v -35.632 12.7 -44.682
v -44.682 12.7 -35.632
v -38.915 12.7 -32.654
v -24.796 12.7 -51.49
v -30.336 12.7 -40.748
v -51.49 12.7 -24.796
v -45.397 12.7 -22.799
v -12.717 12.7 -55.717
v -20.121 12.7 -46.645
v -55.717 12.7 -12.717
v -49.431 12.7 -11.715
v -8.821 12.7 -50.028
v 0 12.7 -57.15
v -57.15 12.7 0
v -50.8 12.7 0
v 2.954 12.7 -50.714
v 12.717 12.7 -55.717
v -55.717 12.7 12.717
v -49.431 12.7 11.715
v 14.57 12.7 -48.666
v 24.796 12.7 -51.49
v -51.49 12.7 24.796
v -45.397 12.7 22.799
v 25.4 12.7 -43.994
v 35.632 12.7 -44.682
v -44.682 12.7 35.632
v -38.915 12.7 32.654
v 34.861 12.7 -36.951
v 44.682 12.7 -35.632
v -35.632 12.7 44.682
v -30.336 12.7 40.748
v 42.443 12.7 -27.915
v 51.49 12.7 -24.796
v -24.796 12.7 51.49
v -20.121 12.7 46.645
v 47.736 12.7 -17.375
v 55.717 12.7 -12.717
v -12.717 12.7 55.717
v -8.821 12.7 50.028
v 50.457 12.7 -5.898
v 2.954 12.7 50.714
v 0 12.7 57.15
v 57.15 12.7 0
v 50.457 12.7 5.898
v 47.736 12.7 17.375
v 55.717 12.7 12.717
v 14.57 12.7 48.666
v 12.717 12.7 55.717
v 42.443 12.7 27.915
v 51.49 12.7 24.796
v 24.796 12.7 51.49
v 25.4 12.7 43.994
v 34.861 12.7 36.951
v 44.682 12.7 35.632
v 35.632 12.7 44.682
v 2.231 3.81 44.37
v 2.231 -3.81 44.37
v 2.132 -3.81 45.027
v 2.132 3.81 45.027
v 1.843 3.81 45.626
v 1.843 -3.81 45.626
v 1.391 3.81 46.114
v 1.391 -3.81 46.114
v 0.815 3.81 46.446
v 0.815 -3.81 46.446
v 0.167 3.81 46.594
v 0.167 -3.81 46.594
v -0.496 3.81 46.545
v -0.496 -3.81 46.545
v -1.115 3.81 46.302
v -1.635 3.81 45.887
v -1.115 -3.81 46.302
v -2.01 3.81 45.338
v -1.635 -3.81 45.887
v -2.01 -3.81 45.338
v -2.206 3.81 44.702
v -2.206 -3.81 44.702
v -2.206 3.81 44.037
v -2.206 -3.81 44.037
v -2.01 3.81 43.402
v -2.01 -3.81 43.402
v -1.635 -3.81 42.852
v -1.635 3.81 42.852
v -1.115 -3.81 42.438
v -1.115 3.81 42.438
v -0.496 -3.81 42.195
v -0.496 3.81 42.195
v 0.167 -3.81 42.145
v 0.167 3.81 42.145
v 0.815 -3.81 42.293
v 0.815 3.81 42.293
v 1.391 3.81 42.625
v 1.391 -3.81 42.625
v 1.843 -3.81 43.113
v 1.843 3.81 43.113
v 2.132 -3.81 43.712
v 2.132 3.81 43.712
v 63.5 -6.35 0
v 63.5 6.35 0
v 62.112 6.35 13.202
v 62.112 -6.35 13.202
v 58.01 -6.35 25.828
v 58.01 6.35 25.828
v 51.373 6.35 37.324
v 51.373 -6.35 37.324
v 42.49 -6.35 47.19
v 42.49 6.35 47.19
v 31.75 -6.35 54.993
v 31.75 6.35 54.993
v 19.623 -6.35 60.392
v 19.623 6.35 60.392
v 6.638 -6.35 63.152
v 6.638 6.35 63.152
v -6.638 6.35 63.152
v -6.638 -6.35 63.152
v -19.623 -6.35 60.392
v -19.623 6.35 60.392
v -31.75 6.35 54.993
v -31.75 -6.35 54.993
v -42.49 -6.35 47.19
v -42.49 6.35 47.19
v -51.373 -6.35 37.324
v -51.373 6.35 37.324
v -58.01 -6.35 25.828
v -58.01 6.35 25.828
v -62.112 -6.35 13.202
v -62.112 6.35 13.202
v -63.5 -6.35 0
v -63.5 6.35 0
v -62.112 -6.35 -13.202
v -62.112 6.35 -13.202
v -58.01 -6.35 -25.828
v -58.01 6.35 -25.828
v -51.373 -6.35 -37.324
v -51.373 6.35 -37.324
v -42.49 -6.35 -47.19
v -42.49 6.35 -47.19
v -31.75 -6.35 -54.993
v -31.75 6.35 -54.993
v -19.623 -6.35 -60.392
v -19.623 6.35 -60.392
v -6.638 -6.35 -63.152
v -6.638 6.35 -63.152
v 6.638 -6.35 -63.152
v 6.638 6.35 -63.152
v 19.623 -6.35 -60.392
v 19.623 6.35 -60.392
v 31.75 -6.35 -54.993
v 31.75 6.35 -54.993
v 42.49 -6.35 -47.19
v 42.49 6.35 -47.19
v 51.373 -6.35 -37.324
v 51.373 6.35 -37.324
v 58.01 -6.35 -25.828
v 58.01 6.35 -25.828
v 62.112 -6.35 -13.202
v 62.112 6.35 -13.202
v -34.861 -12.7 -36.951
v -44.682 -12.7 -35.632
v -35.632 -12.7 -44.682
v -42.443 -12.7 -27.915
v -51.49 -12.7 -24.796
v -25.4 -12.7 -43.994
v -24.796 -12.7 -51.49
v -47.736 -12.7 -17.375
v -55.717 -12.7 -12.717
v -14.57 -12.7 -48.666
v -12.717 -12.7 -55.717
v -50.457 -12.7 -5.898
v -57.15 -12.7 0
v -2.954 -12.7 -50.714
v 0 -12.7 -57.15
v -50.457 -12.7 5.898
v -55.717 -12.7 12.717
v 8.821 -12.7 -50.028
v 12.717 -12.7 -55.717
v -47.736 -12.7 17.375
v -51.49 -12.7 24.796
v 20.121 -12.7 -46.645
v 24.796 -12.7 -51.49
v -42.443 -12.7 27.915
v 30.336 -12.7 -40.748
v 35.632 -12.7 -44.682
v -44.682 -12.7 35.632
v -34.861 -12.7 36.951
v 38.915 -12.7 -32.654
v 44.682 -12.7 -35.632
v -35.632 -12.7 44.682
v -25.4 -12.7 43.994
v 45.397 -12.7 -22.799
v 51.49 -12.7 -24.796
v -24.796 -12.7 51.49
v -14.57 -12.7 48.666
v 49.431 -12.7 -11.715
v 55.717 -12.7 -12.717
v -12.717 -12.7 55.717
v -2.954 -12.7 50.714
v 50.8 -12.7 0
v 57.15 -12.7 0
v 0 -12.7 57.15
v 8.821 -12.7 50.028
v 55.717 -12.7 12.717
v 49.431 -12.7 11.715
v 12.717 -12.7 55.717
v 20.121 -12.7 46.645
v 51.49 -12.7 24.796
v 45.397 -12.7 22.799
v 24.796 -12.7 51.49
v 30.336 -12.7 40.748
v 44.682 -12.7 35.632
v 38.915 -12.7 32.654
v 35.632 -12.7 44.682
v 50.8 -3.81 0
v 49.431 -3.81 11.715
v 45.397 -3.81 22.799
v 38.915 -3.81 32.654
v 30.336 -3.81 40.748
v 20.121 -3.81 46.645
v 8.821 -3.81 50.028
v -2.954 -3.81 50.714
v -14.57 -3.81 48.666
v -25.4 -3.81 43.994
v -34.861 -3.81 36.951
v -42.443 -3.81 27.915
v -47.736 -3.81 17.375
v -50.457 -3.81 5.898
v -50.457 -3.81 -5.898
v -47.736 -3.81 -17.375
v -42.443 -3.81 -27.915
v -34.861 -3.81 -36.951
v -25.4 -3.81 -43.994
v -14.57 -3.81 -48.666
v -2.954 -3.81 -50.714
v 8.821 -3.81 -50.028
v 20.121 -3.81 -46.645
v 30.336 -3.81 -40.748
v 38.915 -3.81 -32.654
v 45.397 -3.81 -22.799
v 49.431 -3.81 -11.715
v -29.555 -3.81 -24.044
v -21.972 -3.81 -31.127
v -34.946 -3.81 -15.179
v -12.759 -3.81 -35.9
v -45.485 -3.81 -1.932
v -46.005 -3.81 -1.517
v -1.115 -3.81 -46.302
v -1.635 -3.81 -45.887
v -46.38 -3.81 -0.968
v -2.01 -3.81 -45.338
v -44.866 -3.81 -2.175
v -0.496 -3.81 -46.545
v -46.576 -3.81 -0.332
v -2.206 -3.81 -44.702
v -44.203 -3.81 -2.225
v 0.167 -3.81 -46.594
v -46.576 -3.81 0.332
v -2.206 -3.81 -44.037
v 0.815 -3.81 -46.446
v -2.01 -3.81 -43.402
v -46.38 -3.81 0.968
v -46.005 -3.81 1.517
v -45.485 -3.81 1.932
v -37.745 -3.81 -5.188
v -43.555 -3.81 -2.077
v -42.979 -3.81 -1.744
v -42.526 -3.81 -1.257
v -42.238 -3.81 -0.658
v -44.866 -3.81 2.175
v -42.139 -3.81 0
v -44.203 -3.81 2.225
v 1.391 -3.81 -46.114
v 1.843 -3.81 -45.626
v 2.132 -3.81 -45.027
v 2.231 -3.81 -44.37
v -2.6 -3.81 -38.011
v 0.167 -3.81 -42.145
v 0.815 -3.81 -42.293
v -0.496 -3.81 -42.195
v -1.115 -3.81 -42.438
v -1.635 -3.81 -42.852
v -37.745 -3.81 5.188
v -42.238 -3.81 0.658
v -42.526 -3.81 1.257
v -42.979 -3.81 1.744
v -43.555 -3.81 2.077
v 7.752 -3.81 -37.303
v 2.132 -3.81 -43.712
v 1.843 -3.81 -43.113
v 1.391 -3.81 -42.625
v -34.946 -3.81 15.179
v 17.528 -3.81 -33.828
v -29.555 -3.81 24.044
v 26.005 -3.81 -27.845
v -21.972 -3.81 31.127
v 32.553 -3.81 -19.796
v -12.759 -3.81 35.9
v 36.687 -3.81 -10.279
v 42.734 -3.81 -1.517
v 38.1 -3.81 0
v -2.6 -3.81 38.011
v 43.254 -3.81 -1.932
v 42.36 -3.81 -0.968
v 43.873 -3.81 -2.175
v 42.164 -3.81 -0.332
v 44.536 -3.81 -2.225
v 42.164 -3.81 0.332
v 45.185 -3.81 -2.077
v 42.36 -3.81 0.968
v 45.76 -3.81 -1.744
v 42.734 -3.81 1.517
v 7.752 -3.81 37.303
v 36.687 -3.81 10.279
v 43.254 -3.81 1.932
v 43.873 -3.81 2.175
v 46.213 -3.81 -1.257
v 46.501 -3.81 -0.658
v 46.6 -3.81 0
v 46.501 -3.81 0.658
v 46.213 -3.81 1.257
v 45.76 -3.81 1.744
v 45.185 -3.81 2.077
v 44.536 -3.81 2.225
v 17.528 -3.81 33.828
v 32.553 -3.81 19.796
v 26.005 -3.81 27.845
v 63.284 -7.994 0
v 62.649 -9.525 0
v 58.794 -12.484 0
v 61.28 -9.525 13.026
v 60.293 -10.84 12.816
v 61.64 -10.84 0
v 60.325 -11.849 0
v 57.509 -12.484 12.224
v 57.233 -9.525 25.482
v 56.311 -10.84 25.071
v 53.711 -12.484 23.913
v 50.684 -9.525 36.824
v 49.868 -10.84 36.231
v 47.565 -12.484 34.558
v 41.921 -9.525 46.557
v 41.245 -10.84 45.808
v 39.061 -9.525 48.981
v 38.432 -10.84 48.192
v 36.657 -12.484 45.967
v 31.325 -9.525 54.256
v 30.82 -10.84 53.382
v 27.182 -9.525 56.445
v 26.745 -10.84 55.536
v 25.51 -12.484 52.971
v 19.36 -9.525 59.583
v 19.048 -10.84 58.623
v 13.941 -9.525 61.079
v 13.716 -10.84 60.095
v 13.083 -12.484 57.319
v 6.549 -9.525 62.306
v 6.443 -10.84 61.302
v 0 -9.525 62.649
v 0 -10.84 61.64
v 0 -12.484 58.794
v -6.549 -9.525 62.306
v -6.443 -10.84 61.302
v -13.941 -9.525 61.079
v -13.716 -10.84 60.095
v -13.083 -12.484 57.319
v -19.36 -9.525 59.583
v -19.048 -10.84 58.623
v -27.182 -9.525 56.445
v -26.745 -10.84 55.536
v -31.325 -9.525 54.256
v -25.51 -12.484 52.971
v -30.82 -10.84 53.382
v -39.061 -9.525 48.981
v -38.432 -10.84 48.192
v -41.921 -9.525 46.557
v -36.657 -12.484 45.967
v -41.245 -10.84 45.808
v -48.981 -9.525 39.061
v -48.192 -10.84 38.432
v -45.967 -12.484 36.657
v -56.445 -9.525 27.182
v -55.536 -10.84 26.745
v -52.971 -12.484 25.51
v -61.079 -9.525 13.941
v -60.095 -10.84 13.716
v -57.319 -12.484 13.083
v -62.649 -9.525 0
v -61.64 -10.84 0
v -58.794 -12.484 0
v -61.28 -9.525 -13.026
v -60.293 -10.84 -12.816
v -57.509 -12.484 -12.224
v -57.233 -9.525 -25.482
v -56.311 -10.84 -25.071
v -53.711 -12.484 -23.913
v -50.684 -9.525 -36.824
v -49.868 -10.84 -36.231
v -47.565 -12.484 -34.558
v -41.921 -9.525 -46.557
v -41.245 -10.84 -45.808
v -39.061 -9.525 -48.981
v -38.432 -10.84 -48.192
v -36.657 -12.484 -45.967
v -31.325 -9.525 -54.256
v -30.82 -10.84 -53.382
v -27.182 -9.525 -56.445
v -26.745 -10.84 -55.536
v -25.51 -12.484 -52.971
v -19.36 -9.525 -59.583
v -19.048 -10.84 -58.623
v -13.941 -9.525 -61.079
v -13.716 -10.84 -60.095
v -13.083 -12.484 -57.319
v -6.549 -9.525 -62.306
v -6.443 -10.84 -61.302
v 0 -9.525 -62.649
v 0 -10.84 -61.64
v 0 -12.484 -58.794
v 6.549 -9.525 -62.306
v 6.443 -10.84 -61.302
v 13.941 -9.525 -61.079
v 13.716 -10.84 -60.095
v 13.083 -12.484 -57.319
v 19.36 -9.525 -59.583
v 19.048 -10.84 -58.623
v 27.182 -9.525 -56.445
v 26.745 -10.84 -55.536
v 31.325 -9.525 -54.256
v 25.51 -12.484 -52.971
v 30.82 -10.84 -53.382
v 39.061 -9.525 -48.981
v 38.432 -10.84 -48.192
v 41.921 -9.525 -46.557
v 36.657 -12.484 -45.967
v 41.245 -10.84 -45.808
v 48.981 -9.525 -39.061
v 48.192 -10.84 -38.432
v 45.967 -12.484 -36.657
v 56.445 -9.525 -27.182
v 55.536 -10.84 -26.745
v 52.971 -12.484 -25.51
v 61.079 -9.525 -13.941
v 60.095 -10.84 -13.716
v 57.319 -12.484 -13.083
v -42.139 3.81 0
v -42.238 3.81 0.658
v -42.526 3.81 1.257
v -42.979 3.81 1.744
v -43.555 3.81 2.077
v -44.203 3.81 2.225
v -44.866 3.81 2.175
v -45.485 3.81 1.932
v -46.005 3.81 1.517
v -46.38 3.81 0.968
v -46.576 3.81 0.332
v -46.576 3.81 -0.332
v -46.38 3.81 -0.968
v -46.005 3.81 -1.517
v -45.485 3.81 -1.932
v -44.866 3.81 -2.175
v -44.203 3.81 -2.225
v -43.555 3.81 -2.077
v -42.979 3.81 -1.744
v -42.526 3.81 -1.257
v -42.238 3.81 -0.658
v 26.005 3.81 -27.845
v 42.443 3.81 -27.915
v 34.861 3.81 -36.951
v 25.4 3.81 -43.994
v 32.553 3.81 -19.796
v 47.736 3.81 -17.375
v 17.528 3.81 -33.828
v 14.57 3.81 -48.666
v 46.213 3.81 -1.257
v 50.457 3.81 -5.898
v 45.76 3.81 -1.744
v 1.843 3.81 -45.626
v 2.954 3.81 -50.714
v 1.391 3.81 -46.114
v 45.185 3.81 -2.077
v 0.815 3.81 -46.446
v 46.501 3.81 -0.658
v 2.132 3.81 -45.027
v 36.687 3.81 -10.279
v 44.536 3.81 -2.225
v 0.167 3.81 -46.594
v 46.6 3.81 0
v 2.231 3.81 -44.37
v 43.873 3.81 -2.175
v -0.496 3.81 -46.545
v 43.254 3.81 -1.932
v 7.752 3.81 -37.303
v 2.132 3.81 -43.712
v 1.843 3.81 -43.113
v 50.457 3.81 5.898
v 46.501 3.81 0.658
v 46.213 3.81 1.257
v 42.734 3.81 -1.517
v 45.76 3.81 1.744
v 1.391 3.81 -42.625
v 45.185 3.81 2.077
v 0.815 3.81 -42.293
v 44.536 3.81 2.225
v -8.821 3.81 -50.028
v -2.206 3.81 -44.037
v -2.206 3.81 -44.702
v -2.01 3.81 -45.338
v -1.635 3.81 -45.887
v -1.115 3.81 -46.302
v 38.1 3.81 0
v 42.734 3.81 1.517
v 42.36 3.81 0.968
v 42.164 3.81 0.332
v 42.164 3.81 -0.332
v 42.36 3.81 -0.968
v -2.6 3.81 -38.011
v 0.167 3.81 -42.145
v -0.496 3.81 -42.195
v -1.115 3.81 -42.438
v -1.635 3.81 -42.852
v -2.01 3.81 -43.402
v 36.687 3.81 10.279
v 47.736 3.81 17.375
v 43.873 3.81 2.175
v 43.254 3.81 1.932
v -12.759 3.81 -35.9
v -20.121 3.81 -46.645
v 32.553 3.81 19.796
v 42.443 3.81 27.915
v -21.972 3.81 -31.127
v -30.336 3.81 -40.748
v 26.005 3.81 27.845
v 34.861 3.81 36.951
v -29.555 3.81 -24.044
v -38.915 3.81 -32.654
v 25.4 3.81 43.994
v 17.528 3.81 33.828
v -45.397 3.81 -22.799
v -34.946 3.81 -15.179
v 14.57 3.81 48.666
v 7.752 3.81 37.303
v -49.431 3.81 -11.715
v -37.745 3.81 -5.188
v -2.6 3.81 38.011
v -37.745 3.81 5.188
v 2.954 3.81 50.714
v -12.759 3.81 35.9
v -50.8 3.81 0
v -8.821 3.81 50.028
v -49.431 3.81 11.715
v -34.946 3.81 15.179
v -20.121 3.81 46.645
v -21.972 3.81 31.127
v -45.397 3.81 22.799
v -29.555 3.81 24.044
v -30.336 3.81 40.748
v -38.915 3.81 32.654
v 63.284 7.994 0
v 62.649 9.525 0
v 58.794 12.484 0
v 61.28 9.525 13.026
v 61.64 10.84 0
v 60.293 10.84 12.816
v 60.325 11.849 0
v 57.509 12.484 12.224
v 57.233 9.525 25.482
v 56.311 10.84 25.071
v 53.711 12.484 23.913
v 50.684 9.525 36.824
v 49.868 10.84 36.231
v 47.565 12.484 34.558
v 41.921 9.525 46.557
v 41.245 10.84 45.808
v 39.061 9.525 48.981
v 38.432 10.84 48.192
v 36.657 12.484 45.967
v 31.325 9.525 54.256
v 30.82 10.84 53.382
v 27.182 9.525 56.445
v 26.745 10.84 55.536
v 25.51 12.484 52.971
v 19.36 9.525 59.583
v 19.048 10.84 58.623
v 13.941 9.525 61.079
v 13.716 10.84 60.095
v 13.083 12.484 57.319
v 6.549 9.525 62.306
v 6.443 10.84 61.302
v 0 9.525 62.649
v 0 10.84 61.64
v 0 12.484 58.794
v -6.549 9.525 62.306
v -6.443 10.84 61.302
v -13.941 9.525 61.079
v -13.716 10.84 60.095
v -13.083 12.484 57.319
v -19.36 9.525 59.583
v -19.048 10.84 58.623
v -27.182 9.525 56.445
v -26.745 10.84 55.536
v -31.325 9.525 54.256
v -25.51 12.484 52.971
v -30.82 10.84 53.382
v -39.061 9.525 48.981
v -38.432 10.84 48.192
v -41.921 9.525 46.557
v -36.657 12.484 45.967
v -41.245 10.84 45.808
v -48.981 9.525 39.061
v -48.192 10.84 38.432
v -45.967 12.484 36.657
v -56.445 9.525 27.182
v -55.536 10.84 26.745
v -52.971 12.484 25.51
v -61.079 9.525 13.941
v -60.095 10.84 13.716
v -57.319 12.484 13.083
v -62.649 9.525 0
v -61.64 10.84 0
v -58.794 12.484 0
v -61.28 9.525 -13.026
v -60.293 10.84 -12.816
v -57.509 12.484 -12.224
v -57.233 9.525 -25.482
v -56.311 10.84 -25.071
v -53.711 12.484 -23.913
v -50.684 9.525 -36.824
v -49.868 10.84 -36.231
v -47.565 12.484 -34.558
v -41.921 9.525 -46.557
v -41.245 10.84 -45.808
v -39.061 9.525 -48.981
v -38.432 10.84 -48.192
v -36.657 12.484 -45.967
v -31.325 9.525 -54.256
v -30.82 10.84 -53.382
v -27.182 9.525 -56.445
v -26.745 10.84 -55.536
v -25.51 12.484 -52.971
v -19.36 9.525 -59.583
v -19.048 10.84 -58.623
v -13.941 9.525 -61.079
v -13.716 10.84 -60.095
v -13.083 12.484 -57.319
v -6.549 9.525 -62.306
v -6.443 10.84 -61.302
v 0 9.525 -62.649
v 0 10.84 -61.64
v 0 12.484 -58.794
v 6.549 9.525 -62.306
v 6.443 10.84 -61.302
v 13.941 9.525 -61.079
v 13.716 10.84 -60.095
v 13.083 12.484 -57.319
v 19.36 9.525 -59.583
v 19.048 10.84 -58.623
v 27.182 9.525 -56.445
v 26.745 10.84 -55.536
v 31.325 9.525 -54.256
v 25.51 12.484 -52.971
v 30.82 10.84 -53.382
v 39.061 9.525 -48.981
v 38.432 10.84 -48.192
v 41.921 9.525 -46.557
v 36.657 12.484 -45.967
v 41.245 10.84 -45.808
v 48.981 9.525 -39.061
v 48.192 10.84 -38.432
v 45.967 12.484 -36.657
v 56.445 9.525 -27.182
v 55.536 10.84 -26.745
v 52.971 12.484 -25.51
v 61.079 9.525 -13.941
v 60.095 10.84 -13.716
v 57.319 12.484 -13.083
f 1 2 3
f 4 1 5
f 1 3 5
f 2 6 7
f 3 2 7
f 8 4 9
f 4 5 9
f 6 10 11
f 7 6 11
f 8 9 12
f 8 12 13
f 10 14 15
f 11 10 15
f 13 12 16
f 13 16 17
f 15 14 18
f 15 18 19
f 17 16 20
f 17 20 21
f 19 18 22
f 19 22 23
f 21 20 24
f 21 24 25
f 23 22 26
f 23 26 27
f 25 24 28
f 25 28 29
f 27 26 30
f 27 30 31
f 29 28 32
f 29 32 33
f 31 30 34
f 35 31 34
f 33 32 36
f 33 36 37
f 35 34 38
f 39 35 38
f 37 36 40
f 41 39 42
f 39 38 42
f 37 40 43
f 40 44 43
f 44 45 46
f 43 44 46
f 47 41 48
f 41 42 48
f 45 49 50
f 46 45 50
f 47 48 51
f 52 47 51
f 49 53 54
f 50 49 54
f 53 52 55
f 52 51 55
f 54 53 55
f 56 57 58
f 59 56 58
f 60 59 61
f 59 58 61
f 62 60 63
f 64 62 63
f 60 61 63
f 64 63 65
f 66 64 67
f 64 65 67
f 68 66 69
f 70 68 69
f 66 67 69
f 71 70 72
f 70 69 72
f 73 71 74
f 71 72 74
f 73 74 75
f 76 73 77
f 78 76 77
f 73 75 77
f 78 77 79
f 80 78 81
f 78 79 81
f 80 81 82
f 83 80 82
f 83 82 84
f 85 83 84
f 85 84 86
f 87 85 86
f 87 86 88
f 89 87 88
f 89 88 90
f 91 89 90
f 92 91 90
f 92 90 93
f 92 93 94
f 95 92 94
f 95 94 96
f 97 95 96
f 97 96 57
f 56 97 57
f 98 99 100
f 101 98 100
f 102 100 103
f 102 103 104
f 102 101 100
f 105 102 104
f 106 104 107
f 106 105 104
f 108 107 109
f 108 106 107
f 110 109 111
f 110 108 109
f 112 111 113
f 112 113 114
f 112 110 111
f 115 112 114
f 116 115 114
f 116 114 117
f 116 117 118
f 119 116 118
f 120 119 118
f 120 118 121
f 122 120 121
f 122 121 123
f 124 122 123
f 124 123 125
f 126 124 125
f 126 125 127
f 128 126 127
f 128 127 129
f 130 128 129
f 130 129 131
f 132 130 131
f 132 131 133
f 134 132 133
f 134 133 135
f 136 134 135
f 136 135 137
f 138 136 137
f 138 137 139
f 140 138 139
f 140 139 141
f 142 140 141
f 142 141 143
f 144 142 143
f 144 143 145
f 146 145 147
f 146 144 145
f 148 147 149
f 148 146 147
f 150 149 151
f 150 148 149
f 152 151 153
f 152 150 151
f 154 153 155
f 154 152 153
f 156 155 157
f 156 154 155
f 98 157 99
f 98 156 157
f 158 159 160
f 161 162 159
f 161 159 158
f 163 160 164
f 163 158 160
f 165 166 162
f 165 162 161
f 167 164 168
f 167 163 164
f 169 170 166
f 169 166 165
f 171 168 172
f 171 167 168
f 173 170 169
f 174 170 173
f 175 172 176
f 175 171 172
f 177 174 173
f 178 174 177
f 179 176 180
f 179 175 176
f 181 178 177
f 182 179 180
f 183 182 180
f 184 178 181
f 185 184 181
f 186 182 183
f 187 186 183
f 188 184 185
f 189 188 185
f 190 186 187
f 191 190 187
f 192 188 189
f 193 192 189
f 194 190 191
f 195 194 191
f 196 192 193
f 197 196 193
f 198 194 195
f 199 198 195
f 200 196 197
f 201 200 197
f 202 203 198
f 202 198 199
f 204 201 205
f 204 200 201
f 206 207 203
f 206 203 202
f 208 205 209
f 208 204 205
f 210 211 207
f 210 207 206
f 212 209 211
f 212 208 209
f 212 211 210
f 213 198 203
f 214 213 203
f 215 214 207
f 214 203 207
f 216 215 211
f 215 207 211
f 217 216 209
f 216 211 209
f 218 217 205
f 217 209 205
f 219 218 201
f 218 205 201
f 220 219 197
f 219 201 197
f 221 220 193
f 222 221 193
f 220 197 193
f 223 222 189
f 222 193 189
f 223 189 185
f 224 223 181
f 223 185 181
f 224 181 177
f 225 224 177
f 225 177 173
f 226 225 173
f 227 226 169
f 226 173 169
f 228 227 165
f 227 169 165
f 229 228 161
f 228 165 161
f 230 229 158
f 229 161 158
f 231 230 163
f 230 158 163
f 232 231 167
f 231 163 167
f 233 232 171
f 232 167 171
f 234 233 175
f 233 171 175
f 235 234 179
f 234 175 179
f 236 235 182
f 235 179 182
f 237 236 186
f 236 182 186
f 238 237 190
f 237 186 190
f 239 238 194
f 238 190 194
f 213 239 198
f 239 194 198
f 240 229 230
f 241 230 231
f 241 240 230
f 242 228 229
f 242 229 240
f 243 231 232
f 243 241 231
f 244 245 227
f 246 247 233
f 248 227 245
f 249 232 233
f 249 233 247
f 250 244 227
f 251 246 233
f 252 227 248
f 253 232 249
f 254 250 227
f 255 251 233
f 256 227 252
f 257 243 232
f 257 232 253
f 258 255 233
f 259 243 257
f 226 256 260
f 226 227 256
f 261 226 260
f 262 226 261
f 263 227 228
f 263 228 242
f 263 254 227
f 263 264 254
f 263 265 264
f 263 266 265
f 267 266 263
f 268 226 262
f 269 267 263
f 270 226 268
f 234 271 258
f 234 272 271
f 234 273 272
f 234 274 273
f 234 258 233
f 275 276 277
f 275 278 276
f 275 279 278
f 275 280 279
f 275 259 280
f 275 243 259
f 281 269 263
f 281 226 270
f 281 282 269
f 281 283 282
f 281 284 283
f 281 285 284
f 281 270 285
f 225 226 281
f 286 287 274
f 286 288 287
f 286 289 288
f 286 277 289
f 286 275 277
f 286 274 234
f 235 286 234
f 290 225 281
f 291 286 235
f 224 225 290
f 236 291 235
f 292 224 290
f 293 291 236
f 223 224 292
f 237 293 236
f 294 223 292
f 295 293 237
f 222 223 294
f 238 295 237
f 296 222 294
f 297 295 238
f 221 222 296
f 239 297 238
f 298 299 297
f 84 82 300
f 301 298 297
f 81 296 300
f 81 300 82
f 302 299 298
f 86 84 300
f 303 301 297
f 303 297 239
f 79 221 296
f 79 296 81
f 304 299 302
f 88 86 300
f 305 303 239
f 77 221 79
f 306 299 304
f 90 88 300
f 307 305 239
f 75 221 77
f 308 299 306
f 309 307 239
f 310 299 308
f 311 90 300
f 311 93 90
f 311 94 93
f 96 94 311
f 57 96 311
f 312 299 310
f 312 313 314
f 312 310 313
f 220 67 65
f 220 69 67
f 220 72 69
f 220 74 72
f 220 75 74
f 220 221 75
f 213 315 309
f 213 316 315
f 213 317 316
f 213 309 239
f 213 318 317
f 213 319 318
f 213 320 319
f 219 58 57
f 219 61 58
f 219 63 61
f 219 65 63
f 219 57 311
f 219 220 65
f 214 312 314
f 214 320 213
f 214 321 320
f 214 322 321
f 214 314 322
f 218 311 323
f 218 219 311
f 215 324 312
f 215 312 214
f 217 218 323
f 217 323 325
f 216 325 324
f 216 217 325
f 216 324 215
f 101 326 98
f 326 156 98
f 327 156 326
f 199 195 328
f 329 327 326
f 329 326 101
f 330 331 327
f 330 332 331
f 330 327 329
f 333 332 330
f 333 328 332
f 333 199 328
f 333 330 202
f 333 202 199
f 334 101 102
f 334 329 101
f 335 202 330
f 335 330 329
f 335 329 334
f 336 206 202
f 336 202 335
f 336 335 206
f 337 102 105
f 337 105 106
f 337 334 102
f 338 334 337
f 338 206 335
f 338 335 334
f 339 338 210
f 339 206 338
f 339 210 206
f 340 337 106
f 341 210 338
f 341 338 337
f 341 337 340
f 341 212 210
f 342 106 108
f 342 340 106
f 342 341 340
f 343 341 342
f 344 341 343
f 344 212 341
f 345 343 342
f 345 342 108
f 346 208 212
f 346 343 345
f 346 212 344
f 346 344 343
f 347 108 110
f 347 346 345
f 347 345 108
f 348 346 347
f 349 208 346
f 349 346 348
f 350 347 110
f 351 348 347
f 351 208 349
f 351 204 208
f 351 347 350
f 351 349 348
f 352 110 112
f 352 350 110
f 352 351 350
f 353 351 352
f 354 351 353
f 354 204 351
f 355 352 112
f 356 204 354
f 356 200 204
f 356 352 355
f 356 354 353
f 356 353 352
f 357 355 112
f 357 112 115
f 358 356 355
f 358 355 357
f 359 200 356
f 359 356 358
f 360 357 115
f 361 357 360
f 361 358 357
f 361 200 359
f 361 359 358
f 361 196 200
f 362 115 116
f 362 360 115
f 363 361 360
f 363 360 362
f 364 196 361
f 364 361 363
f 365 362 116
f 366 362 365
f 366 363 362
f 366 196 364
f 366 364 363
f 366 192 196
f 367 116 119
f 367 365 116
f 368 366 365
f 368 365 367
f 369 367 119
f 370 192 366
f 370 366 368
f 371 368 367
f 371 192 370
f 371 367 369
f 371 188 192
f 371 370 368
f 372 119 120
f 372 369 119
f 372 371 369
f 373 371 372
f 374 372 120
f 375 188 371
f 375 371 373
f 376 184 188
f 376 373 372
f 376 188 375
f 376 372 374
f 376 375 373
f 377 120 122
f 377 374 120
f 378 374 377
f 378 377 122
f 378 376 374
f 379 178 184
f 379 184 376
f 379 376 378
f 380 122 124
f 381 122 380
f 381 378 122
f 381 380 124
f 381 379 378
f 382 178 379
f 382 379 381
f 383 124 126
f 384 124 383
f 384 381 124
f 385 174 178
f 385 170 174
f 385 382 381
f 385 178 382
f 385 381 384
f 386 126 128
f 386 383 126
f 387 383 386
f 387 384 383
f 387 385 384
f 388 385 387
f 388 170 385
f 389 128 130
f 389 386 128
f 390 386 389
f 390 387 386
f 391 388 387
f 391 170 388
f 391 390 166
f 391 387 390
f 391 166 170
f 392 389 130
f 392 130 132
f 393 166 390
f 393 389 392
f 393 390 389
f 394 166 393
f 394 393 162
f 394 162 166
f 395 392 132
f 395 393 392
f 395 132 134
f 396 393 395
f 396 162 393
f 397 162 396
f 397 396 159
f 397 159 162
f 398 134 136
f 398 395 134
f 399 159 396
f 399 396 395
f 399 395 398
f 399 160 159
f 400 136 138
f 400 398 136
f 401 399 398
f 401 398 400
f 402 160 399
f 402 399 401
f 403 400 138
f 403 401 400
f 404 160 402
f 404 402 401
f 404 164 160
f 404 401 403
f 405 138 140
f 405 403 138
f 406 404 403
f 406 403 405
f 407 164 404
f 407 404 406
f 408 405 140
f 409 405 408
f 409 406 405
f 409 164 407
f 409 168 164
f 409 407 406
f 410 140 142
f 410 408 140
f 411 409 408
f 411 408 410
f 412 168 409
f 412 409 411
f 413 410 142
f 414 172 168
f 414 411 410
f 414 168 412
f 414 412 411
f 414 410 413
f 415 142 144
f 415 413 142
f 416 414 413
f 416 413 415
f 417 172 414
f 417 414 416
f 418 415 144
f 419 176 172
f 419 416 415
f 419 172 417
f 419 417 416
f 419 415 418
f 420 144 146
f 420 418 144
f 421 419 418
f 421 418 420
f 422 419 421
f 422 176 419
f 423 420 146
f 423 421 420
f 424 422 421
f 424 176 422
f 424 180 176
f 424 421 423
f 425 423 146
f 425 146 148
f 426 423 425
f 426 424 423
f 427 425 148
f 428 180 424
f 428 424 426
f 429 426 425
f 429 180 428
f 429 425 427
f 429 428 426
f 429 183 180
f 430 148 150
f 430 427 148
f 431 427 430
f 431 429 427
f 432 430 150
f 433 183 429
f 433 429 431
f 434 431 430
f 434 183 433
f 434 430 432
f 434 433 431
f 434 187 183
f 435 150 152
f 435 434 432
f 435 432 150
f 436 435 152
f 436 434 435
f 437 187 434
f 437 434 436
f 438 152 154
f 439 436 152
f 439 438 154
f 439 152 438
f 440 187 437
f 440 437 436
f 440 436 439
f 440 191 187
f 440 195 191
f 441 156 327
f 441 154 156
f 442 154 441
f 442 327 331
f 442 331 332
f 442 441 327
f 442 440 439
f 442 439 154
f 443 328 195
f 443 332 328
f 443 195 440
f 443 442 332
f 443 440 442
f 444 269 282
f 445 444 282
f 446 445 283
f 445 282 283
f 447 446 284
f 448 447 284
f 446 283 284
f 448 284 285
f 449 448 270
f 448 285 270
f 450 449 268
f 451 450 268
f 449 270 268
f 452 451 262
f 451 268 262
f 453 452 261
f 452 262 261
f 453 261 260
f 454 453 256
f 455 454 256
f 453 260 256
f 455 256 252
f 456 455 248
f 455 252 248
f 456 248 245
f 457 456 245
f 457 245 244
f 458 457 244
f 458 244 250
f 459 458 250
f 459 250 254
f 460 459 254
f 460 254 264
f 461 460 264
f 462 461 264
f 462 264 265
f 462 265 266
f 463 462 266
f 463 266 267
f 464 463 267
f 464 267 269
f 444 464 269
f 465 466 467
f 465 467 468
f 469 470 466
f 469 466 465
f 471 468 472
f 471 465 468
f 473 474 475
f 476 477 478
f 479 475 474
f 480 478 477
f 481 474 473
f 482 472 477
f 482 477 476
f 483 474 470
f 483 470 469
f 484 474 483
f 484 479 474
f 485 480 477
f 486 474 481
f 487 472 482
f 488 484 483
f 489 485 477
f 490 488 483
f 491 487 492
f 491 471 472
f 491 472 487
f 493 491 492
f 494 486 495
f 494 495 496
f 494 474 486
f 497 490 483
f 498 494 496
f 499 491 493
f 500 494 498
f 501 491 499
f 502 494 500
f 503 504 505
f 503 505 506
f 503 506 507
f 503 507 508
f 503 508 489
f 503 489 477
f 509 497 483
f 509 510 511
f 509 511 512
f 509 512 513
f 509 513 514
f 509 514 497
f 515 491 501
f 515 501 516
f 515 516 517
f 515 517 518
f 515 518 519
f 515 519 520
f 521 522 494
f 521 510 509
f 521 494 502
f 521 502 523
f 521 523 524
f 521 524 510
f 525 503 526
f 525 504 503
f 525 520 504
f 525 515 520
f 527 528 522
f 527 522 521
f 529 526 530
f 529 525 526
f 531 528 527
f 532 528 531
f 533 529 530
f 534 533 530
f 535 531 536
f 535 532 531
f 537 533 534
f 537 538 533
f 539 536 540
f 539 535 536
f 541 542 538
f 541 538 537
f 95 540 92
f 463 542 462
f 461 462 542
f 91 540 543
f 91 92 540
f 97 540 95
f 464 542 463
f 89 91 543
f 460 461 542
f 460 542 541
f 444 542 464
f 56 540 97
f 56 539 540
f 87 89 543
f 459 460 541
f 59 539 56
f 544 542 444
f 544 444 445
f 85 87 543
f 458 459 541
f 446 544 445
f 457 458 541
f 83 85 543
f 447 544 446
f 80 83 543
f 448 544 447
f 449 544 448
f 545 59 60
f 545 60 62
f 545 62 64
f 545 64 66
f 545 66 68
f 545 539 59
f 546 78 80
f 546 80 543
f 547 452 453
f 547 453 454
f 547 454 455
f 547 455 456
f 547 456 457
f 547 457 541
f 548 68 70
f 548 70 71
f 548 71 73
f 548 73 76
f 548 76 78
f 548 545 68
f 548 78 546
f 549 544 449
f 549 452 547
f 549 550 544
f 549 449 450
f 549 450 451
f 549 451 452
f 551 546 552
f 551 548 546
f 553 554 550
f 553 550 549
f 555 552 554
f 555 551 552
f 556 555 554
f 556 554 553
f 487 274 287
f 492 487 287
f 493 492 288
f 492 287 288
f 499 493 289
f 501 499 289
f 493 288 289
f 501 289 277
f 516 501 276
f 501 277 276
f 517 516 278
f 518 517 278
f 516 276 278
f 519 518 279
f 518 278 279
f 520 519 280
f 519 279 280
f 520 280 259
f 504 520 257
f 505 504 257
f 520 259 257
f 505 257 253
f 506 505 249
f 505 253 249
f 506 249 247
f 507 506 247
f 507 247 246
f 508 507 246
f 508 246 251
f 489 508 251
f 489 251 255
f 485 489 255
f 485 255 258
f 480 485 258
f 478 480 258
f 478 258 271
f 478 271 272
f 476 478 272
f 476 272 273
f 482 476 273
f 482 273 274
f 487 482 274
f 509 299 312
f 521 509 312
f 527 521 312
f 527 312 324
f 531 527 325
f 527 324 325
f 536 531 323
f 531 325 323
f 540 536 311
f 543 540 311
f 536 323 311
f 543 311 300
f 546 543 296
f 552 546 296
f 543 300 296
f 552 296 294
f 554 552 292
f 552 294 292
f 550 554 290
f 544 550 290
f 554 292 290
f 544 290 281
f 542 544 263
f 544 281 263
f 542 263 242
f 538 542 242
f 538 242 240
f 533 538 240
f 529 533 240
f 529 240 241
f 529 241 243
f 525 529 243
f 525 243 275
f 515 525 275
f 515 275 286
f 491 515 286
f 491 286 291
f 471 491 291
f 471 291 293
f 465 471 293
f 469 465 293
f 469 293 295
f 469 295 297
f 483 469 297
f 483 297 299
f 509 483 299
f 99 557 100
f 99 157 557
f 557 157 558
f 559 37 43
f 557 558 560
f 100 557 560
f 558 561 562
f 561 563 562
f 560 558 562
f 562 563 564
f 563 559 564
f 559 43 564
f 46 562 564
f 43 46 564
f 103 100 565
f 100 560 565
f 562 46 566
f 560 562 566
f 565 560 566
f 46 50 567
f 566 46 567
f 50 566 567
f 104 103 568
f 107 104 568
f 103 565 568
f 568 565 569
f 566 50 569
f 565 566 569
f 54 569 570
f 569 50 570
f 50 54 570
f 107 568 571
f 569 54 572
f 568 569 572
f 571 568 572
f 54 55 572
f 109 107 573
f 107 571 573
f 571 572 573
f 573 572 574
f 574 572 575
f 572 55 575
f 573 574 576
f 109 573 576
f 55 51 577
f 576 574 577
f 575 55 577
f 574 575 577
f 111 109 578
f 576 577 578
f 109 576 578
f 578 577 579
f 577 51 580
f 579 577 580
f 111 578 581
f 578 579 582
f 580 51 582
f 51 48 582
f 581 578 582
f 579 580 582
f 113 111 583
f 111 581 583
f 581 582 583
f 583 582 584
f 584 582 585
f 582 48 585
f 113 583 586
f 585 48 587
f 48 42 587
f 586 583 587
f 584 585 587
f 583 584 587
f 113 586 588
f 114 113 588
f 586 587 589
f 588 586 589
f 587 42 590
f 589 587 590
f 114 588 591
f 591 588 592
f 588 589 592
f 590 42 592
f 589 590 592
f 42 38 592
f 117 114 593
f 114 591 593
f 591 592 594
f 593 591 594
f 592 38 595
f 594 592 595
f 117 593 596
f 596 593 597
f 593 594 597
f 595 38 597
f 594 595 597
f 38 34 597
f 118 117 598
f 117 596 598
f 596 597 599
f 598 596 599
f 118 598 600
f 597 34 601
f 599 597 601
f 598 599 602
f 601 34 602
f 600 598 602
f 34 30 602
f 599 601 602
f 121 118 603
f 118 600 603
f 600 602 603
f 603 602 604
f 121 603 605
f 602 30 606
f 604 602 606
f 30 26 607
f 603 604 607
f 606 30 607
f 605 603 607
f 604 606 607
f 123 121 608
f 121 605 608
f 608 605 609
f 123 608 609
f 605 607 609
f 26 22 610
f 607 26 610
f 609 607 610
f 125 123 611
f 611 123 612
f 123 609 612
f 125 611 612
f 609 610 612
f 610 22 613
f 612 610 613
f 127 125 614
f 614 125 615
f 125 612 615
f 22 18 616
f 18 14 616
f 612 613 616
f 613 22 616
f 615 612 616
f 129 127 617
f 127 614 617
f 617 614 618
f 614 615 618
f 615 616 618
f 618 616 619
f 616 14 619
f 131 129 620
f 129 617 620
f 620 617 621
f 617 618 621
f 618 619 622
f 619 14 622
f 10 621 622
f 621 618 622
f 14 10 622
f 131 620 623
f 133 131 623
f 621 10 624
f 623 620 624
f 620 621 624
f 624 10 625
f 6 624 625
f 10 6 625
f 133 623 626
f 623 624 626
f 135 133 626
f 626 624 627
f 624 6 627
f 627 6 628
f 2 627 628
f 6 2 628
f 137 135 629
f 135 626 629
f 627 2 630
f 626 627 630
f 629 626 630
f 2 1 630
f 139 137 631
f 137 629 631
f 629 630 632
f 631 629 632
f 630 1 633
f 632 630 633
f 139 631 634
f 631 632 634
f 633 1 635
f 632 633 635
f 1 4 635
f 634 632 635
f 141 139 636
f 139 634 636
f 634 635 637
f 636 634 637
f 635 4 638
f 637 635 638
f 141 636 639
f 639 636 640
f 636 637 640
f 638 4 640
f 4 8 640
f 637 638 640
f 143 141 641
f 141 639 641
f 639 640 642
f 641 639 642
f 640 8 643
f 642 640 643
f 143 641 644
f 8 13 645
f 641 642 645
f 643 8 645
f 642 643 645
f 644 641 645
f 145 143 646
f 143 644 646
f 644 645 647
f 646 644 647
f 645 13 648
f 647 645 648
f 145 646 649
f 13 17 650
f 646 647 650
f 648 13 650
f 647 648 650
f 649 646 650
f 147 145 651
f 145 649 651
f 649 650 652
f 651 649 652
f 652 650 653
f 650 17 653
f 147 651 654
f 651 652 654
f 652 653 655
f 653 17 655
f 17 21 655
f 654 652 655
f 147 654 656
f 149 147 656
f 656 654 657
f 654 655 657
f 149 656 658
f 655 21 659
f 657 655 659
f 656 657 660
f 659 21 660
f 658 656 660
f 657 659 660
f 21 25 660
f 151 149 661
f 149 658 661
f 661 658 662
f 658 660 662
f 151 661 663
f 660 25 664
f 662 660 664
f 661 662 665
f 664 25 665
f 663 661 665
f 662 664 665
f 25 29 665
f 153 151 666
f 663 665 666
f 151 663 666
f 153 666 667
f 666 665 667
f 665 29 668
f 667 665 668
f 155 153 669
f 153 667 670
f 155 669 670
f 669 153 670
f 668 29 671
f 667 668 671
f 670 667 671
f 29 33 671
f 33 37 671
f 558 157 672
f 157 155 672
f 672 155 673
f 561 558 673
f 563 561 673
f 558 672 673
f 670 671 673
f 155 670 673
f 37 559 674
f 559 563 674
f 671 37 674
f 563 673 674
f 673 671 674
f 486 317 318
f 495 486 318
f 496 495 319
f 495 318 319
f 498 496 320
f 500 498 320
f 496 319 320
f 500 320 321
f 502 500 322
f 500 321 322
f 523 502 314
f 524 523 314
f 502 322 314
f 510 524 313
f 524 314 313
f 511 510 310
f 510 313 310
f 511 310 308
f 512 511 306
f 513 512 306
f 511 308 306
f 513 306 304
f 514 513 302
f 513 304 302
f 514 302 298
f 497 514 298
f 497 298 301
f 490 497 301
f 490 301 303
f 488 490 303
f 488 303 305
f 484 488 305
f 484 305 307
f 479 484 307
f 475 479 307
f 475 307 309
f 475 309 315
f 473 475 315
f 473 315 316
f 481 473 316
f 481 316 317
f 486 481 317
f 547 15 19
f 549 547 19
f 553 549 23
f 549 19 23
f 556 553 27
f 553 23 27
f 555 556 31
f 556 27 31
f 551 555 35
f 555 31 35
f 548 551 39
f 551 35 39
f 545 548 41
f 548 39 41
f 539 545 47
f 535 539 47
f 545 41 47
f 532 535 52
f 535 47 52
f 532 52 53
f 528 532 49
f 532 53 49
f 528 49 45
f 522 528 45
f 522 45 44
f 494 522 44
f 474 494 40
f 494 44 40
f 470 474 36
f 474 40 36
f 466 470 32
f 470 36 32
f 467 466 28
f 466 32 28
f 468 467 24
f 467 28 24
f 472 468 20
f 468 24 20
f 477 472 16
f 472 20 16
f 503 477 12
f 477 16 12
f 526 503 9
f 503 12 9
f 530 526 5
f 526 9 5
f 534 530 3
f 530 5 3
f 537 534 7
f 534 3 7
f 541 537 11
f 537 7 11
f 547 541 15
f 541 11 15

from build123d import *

# Parameters (mm, degrees)
F0_R      = 63.5
F1_DEPTH  = 12.7
F2_R      = 6.35
F3_R      = 50.8
F4_DEPTH  = 8.89
F5_R      = 50.8
F6_DEPTH  = 8.89
F7_R      = 38.1
F8_DEPTH  = 25.401
F9_R      = 2.230901
F10_DEPTH = 16.511


with BuildPart() as f1:
    # F0 (on Front) → F1 (new body, symmetric)
    with BuildSketch(Plane.XZ):
        Circle(F0_R)
    extrude(amount=F1_DEPTH, both=True)

    # F2
    f2_edges = [f1.edges().sort_by_distance(p)[0] for p in [
        (-63.5, -12.7, 0),
        (-63.5, 12.7, 0),
    ]]
    fillet(f2_edges, radius=F2_R)

    # F3 (on face) → F4 (cut)
    with BuildSketch(Plane.XZ.offset(12.7)):
        Circle(F3_R)
    extrude(amount=-F4_DEPTH, mode=Mode.SUBTRACT)

    # F5 (on face) → F6 (cut)
    with BuildSketch(Plane(origin=(0, 12.7, 0), x_dir=(-1, 0, 0), z_dir=(0, 1, 0))):
        Circle(F5_R)
    extrude(amount=-F6_DEPTH, mode=Mode.SUBTRACT)

    # F7 (on face) → F8 (cut, through all)
    with BuildSketch(Plane.XZ.offset(12.7)):
        Circle(F7_R)
    extrude(amount=-F8_DEPTH, mode=Mode.SUBTRACT)

    # F9 (on face) → F10 (cut, through all)
    with BuildSketch(Plane.XZ.offset(3.81)):
        with Locations((-44.369552, 0)):
            Circle(F9_R)
        with Locations((0, 44.369552)):
            Circle(F9_R)
        with Locations((44.369552, 0)):
            Circle(F9_R)
        with Locations((0, -44.369552)):
            Circle(F9_R)
    extrude(amount=-F10_DEPTH, mode=Mode.SUBTRACT)


solid = f1.part
